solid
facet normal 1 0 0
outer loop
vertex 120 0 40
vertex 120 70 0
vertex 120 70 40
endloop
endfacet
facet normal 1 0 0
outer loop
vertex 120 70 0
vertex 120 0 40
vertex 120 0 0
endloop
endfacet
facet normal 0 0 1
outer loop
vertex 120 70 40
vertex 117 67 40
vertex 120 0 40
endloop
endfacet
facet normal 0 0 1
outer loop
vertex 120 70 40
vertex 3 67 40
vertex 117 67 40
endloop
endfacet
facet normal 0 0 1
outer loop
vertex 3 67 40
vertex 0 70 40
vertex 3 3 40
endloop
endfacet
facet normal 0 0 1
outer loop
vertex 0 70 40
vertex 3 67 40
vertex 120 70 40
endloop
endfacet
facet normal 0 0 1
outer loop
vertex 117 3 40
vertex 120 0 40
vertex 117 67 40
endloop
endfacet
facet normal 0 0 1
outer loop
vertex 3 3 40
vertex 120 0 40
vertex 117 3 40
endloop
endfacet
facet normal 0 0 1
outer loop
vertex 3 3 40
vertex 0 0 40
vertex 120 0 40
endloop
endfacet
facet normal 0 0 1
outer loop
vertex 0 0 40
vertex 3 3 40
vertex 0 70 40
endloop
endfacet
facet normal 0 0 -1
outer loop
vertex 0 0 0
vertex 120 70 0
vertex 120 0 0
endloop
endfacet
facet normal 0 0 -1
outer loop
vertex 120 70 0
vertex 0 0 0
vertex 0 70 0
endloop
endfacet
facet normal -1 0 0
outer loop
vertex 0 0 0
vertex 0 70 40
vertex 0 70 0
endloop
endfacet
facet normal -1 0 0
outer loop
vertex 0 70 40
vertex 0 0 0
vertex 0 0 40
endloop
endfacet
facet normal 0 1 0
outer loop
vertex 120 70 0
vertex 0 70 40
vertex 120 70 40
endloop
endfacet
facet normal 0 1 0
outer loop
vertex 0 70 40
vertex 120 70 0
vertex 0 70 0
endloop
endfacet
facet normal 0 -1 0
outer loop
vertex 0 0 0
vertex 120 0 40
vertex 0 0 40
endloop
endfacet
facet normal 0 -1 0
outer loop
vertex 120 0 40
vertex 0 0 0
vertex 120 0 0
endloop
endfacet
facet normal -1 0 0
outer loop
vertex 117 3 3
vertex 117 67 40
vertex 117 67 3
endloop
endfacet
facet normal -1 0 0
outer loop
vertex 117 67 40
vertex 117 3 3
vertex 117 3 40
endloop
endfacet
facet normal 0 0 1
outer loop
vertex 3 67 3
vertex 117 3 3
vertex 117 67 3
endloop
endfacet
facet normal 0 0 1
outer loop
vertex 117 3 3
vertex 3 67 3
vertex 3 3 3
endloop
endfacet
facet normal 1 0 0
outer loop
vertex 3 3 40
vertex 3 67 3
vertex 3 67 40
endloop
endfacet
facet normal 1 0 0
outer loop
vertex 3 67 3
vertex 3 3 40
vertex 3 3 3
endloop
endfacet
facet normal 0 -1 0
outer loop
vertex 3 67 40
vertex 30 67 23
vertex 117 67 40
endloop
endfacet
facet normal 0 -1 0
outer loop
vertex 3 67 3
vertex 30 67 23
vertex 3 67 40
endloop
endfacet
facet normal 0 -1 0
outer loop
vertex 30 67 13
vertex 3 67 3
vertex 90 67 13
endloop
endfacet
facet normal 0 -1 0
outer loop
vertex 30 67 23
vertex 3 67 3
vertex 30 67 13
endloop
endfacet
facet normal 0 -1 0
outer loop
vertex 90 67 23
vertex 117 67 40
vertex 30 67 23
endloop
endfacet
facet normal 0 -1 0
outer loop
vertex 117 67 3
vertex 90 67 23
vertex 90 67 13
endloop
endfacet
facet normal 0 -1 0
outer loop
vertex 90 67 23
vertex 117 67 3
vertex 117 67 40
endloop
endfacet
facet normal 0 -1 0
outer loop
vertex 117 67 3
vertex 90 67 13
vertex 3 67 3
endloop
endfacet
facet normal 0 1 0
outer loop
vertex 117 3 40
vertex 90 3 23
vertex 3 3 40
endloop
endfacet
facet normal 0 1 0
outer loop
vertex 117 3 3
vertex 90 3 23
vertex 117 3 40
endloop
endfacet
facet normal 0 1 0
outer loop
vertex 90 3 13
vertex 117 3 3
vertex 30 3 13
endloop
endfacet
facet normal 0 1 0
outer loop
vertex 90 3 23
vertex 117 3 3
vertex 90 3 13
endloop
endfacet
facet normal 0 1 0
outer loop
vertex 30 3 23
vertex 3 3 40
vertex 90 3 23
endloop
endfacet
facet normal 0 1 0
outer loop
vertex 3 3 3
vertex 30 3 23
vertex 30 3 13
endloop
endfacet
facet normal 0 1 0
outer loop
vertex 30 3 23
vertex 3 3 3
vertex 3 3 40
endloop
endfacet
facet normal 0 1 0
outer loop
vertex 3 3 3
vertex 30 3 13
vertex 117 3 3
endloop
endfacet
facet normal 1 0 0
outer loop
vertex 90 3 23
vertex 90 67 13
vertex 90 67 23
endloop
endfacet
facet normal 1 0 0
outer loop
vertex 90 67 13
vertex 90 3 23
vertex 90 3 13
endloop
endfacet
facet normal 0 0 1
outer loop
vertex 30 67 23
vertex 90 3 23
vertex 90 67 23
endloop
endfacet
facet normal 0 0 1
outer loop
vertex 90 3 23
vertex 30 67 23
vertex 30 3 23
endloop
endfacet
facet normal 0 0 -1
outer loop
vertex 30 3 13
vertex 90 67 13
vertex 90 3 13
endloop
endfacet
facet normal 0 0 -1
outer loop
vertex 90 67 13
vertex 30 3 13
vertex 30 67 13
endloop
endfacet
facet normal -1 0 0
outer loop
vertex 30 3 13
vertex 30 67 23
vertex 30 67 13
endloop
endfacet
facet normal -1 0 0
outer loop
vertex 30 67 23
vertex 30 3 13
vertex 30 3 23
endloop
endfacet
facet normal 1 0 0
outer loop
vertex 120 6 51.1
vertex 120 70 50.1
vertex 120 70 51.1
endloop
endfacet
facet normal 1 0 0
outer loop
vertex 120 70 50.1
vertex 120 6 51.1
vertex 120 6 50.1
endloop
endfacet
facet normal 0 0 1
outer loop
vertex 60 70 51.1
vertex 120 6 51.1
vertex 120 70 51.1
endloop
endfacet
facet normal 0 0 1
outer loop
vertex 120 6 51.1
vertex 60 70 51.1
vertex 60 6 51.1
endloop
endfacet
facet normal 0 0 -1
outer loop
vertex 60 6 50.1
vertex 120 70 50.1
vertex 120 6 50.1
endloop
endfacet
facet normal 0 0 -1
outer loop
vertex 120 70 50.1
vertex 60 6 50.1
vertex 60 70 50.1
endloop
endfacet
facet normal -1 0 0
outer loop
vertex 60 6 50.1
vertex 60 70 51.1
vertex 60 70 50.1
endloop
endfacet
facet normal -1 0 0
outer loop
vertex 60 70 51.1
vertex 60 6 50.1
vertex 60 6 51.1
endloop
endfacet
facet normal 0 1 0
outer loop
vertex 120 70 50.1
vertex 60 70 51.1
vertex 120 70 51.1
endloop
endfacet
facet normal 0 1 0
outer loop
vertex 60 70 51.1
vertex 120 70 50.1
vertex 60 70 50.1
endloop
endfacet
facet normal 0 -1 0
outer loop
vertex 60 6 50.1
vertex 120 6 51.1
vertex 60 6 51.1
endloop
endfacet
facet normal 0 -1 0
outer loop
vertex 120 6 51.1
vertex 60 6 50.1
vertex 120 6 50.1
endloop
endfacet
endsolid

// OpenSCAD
// Buffer Tank for Mini Horizontal Gel Electrophoresis
// Units: millimetres

// Outer Dimensions
$outer_x = 120;
$outer_y = 70;
$outer_z = 40;

// Wall and Floor Thickness
$wall_thick = 3;
$floor_thick = 3;

// Platform Dimensions
$platform_x = 60;
$platform_y = $outer_y; // Spans full inner width
$platform_height = 10;  // Height above inner floor
$platform_z_top = $outer_z - $wall_thick - $floor_thick + $platform_height; // 40 - 3 - 3 + 10 = 44

// Hole Dimensions
$hole_diameter = 2;
$hole_y = 0;
$hole_z = 30;

// Configuration
$fn = 128; // High resolution for smooth curves and accurate hole sizing

// Derived Dimensions
$inner_x = $outer_x - 2*$wall_thick; // 114
$inner_y = $outer_y - 2*$wall_thick; // 64
$inner_z = $outer_z - $floor_thick;  // 37 (Top of inner floor)

// Main Tank Body
// Constructed as a hollow box with a floor
difference() {
    // Outer Block
    cube([
        $outer_x, 
        $outer_y, 
        $outer_z
    ], center = false);

    // Inner Void (Hollow part)
    // The void starts at the top of the floor and goes up to the top of the tank
    translate([
        $wall_thick, 
        $wall_thick, 
        $floor_thick
    ]) {
        cube([
            $inner_x, 
            $inner_y, 
            $outer_z - $floor_thick
        ], center = false);
    }
    
    // Extend the inner void slightly past the top to ensure clean cut
    translate([
        $wall_thick, 
        $wall_thick, 
        $outer_z + 0.1
    ]) {
        cube([
            $inner_x, 
            $inner_y, 
            1
        ], center = false);
    }
}

// Raised Platform
// Located in the middle of the tank, spanning full inner width
translate([
    ($outer_x - $platform_x) / 2, 
    $wall_thick, // Positioned at the inner wall Y coordinate
    $floor_thick + $platform_height
]) {
    // Platform Base (matching the void cut logic to ensure it sits flush inside)
    // We model the platform as a solid block that sits inside the tank volume
    // Its bottom is at z = floor_thick + platform_height = 3 + 10 = 13
    // Its top is at z = 44
    // It spans the full inner width (Y)
    
    // To make it a solid part of the tank, we add it to the union of the tank walls
    // However, since we used difference() for the tank, we need to add this platform 
    // as a separate positive object that overlaps with the tank walls.
    
    // Platform Dimensions:
    // X: 60 (centered)
    // Y: Full inner width (64)
    // Z: From 13 to 44 (height 31)
    
    cube([
        $platform_x,
        $inner_y,
        $platform_height
    ], center = false);
    
    // Extend slightly above to ensure it connects seamlessly with the top wall
    translate([
        ($outer_x - $platform_x) / 2,
        $wall_thick,
        $outer_z - $wall_thick + 0.1
    ]) {
        cube([
            $platform_x,
            $inner_y,
            1
        ], center = false);
    }
}

// Electrode Holes
// Two holes, one at each X end, through the end walls
// Position: y = 0, z = 30
// Direction: Along X axis

// We need to cut these holes through the tank walls.
// Since the tank is defined by a difference of a solid and a void, 
// we can simply use difference() again on the whole assembly to cut the holes.
// The holes are cylinders oriented along X.

difference() {
    // Re-create the base tank and platform logic here to ensure the holes cut through everything
    // OR, simpler: Just cut the holes from the existing assembly if we were building incrementally.
    // Since this is a single script, we will rebuild the tank and platform, then subtract the holes.
    
    // 1. Tank Body
    difference() {
        cube([
            $outer_x, 
            $outer_y, 
            $outer_z
        ], center = false);
        
        translate([
            $wall_thick, 
            $wall_thick, 
            $floor_thick
        ]) {
            cube([
                $inner_x, 
                $inner_y, 
                $outer_z - $floor_thick
            ], center = false);
            
            // Extend void past top
            translate([
                $wall_thick, 
                $wall_thick, 
                $outer_z + 0.1
            ]) {
                cube([
                    $inner_x, 
                    $inner_y, 
                    1
                ], center = false);
            }
        }
    }
    
    // 2. Platform
    translate([
        ($outer_x - $platform_x) / 2, 
        $wall_thick, 
        $floor_thick + $platform_height
    ]) {
        cube([
            $platform_x,
            $inner_y,
            $platform_height
        ], center = false);
        
        // Extend above
        translate([
            ($outer_x - $platform_x) / 2,
            $wall_thick,
            $outer_z - $wall_thick + 0.1
        ]) {
            cube([
                $platform_x,
                $inner_y,
                1
            ], center = false);
        }
    }
    
    // 3. Cut Holes
    // Left Hole
    translate([
        -$outer_x/2 + $hole_diameter/2, // Centered on left face
        $hole_y,
        $hole_z
    ]) {
        cylinder(
            h = $outer_x + 1, // Extend past both ends
            r = $hole_diameter/2,
            $fn = $fn
        );
    }
    
    // Right Hole
    translate([
        $outer_x/2 - $hole_diameter/2, // Centered on right face
        $hole_y,
        $hole_z
    ]) {
        cylinder(
            h = $outer_x + 1, // Extend past both ends
            r = $hole_diameter/2,
            $fn = $fn
        );
    }
}
